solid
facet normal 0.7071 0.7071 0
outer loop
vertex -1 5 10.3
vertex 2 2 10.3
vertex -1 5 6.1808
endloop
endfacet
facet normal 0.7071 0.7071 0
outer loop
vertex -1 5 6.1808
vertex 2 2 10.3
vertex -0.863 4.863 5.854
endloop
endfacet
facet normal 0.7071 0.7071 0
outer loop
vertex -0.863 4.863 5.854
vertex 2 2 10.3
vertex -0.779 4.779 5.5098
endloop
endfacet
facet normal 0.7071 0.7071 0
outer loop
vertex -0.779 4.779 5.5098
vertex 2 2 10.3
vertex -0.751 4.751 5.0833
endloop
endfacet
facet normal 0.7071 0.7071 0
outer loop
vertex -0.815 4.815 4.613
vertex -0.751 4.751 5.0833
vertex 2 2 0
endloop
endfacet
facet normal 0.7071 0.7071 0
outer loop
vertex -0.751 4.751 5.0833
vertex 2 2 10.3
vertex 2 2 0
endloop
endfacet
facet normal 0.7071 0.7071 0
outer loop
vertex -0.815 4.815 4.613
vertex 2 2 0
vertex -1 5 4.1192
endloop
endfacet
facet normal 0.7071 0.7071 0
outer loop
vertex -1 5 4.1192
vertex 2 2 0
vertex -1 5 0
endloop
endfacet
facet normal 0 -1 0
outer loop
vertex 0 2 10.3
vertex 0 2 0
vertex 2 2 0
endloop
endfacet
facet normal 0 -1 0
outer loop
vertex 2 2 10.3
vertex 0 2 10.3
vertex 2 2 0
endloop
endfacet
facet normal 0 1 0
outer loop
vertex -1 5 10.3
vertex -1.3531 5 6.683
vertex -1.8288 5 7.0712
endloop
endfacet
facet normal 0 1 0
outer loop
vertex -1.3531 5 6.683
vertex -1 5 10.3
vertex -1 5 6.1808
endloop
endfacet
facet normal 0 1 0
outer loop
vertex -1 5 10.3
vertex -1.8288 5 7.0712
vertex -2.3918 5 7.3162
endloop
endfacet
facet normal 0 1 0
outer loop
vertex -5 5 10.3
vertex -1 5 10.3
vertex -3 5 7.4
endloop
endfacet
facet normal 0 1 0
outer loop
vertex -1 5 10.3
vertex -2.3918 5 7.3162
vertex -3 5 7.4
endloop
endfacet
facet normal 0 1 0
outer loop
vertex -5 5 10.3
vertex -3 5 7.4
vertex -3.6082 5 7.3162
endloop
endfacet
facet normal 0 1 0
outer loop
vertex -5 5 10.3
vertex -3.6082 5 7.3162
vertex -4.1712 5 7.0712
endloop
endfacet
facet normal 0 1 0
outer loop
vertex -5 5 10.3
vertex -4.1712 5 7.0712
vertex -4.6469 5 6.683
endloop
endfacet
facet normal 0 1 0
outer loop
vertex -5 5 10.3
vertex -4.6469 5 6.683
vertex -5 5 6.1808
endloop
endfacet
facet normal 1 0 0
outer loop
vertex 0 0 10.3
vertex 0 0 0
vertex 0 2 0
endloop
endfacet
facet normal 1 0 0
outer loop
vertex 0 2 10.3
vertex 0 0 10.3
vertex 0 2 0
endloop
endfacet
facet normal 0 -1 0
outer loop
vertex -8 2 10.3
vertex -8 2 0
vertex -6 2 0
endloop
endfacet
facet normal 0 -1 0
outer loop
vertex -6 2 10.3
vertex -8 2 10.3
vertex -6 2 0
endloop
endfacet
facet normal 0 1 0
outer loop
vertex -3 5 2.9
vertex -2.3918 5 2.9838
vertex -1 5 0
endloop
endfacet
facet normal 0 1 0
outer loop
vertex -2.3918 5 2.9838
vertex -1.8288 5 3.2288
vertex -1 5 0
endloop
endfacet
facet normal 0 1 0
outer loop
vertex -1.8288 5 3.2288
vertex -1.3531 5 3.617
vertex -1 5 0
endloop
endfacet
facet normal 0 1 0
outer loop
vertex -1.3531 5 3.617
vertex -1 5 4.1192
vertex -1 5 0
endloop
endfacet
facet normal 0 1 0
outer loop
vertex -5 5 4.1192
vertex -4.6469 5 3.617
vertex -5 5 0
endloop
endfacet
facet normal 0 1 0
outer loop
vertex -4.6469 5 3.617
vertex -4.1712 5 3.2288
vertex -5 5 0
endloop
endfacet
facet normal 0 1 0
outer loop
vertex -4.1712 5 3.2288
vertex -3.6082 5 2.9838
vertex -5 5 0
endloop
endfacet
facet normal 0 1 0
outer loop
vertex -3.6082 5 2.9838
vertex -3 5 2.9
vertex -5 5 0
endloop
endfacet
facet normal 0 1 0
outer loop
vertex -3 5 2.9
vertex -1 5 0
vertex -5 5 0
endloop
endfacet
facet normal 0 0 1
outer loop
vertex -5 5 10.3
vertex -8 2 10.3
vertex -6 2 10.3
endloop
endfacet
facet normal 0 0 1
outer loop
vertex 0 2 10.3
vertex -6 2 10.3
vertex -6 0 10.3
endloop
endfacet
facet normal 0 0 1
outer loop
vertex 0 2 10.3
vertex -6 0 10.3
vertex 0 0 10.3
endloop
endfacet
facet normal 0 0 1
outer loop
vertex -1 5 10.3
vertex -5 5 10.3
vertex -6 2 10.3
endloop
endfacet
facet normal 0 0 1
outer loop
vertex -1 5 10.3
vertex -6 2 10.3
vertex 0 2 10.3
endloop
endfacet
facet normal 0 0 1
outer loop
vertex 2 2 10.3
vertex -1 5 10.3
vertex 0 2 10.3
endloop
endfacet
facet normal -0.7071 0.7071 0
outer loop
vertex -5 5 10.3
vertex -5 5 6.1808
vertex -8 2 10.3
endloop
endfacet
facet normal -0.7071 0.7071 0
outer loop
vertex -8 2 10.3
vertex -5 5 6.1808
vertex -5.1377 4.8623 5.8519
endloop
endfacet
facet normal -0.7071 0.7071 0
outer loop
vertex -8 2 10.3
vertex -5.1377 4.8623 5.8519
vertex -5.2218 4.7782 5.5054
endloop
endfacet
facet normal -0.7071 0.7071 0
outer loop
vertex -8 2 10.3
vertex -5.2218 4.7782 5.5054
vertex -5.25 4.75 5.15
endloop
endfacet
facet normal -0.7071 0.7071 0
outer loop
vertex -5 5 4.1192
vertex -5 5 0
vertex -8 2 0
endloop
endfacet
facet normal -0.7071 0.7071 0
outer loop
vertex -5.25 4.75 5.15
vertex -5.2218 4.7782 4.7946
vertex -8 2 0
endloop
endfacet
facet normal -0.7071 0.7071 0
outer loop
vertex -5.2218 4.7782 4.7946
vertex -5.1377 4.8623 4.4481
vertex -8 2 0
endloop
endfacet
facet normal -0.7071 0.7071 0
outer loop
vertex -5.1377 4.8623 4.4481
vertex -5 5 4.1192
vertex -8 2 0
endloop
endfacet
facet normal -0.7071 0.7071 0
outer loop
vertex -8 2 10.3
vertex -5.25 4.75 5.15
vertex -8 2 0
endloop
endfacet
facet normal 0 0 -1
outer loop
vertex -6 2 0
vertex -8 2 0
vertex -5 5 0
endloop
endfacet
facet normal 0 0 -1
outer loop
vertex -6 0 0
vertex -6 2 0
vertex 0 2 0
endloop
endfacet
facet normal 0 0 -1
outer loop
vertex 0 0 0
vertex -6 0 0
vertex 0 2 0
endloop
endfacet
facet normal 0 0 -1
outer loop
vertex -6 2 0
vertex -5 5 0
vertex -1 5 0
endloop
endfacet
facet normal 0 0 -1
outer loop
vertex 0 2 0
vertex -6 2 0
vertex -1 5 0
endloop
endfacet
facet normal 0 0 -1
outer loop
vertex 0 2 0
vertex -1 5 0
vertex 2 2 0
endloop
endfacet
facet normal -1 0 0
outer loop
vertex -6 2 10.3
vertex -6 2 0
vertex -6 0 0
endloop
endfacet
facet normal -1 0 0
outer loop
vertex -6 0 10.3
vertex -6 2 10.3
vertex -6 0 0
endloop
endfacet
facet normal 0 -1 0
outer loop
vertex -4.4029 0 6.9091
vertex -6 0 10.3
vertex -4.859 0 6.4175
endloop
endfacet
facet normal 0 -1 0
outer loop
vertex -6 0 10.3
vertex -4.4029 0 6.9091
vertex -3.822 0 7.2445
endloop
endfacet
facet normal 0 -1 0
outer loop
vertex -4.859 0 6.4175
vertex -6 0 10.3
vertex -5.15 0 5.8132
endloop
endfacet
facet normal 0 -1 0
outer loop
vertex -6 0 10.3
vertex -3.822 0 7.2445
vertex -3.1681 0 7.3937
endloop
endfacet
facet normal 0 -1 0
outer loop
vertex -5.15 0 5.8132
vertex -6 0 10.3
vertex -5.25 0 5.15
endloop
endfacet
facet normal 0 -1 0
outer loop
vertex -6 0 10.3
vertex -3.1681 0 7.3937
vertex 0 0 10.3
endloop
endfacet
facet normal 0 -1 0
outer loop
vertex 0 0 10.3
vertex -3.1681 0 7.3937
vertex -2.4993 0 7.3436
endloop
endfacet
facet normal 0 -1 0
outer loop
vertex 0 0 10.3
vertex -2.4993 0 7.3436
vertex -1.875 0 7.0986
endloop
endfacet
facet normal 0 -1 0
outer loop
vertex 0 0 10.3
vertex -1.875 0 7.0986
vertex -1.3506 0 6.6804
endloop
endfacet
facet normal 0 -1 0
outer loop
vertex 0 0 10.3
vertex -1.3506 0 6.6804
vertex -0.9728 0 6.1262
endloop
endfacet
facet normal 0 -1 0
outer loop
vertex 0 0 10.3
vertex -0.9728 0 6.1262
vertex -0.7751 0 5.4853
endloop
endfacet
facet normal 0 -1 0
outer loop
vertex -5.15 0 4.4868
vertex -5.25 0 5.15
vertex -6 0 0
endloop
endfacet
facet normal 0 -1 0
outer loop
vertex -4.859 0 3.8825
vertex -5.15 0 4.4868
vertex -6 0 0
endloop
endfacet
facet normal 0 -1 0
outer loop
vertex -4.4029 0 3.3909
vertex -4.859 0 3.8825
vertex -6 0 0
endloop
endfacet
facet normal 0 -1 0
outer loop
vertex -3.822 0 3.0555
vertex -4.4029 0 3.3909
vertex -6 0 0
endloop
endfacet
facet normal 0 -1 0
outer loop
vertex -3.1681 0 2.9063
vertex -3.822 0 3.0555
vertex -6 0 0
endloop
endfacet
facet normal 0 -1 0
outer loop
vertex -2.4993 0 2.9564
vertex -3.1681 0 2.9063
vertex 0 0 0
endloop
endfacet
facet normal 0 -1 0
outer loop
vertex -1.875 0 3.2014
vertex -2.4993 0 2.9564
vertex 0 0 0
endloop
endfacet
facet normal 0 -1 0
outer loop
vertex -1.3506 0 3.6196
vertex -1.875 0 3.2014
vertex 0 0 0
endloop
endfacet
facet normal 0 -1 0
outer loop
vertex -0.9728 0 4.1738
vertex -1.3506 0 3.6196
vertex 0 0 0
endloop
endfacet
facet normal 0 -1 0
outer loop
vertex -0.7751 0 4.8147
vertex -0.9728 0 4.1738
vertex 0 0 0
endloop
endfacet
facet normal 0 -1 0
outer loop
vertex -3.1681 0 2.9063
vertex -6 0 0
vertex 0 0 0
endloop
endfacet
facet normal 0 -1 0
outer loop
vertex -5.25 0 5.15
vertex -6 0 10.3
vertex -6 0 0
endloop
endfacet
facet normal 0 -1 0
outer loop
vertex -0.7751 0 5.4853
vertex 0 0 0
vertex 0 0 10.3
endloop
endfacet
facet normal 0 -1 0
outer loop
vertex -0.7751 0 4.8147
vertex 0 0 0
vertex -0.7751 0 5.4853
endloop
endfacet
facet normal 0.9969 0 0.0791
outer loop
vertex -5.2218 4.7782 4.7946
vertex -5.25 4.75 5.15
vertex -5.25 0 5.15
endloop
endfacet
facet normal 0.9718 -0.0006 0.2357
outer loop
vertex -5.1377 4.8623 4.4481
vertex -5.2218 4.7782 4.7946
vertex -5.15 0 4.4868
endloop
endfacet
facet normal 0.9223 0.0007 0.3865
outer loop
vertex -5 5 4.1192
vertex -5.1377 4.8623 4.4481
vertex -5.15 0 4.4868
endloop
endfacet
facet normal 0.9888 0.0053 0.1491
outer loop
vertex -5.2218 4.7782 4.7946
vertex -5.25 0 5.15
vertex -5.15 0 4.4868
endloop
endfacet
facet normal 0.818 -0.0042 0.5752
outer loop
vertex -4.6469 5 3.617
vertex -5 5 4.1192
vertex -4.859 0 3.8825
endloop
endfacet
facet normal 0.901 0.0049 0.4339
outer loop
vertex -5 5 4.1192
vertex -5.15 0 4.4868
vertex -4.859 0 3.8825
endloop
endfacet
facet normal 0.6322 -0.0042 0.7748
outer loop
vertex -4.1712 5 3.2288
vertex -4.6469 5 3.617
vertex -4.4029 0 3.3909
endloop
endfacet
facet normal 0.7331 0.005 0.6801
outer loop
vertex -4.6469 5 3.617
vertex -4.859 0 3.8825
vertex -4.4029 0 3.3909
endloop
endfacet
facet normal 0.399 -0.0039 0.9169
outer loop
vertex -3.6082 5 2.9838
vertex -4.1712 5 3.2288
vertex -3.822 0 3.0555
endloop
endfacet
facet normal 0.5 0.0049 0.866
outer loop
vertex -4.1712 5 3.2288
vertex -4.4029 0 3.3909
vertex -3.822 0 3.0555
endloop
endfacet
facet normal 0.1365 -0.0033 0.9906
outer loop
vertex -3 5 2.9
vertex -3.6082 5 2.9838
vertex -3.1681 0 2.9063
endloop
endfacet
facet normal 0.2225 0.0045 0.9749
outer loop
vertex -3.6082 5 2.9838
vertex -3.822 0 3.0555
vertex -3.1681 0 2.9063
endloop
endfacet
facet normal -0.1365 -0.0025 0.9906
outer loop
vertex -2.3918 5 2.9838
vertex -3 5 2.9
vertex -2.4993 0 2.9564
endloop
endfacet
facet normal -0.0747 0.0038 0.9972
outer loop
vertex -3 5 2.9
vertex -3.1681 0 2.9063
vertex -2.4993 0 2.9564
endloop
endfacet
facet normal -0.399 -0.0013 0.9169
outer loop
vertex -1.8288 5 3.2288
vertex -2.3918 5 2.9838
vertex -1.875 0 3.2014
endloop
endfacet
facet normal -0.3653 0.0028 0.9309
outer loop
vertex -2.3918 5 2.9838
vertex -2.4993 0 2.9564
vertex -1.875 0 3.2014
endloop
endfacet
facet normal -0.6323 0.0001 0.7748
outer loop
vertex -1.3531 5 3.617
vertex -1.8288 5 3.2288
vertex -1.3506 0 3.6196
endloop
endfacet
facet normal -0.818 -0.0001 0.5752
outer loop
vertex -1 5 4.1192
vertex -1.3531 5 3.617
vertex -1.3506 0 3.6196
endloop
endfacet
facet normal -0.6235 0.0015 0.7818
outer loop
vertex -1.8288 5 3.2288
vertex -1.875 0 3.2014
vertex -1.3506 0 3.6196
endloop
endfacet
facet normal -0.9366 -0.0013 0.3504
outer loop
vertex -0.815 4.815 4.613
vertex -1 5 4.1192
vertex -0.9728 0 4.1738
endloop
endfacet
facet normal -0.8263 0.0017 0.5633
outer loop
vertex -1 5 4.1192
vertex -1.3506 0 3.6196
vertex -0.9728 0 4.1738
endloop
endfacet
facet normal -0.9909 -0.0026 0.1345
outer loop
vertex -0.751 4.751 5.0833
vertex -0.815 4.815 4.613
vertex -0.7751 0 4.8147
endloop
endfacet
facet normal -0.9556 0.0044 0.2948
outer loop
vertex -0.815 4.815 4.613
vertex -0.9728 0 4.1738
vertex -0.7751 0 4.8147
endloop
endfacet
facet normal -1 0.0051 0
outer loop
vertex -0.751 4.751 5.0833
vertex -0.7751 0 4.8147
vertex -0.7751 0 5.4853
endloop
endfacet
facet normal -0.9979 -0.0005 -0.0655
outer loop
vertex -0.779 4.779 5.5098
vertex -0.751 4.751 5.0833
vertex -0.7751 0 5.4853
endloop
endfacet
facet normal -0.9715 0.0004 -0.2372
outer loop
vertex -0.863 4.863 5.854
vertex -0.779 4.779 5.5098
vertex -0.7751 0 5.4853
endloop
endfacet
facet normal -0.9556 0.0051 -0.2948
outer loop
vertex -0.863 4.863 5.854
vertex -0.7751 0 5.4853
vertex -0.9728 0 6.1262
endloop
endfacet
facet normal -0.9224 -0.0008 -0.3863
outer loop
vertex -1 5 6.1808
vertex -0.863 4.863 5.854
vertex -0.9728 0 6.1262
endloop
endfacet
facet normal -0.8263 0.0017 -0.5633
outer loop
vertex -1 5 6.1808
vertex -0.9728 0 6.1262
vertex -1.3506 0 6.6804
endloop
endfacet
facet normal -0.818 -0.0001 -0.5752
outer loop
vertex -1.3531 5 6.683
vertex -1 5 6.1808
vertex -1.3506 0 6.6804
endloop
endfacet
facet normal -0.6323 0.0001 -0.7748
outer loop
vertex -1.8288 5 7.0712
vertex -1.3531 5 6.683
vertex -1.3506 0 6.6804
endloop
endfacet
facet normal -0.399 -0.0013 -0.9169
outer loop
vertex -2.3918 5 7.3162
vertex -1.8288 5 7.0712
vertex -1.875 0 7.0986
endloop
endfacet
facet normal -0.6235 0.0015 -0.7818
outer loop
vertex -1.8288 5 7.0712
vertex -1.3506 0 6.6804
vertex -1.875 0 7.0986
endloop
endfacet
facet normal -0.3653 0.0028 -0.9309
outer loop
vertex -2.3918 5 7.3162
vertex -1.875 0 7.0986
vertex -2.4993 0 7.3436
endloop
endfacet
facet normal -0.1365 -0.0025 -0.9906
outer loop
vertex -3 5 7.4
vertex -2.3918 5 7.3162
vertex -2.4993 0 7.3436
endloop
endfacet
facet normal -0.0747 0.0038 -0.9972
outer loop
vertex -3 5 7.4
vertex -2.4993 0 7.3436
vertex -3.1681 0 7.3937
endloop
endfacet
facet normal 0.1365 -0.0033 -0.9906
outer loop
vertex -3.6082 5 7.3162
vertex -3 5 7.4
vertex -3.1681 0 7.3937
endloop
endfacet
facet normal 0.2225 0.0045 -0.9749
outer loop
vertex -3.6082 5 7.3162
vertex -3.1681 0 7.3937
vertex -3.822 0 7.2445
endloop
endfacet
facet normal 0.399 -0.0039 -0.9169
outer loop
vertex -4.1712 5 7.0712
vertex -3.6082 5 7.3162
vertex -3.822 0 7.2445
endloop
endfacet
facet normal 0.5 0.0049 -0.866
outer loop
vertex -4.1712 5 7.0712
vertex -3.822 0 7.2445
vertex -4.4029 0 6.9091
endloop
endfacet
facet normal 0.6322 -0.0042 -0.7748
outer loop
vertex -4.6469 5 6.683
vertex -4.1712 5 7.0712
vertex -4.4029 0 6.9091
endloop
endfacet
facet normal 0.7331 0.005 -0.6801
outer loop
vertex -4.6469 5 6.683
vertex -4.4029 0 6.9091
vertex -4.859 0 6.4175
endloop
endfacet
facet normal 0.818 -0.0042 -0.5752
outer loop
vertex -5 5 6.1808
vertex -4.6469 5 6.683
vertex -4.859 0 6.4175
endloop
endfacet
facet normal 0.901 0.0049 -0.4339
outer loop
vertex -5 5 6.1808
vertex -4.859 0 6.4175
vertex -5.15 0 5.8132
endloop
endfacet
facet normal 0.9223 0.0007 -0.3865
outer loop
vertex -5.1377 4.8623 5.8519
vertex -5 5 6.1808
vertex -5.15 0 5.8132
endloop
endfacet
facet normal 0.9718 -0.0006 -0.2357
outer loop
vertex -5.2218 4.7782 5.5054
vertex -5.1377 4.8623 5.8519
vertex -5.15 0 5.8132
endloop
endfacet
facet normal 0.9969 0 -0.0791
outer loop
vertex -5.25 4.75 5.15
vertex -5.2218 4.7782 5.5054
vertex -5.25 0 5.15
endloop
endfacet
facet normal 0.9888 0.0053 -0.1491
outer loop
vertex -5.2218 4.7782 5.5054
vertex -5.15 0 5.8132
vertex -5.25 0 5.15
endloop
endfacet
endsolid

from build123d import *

# Parameters (mm, degrees)
BOSS_EXTRU_1_DEPTH = 10.3
D_GAGEMENT_M41_D   = 4.5


with BuildPart() as part:
    # Esquisse1 → Boss.-Extru.1 (new body)
    with BuildSketch(Plane.XY):
        Polygon((0, 0), (0, 2), (2, 2), (-1, 5), (-5, 5), (-8, 2), (-6, 2), (-6, 0), align=None)
    extrude(amount=BOSS_EXTRU_1_DEPTH)

    # Dégagement M41 (through all)
    with Locations(Plane(origin=(0, 5, 0), x_dir=(1, 0, 0), z_dir=(0, 1, 0))):
        with Locations((-3, -5.15)):
            Hole(D_GAGEMENT_M41_D / 2)


solid = part.part
